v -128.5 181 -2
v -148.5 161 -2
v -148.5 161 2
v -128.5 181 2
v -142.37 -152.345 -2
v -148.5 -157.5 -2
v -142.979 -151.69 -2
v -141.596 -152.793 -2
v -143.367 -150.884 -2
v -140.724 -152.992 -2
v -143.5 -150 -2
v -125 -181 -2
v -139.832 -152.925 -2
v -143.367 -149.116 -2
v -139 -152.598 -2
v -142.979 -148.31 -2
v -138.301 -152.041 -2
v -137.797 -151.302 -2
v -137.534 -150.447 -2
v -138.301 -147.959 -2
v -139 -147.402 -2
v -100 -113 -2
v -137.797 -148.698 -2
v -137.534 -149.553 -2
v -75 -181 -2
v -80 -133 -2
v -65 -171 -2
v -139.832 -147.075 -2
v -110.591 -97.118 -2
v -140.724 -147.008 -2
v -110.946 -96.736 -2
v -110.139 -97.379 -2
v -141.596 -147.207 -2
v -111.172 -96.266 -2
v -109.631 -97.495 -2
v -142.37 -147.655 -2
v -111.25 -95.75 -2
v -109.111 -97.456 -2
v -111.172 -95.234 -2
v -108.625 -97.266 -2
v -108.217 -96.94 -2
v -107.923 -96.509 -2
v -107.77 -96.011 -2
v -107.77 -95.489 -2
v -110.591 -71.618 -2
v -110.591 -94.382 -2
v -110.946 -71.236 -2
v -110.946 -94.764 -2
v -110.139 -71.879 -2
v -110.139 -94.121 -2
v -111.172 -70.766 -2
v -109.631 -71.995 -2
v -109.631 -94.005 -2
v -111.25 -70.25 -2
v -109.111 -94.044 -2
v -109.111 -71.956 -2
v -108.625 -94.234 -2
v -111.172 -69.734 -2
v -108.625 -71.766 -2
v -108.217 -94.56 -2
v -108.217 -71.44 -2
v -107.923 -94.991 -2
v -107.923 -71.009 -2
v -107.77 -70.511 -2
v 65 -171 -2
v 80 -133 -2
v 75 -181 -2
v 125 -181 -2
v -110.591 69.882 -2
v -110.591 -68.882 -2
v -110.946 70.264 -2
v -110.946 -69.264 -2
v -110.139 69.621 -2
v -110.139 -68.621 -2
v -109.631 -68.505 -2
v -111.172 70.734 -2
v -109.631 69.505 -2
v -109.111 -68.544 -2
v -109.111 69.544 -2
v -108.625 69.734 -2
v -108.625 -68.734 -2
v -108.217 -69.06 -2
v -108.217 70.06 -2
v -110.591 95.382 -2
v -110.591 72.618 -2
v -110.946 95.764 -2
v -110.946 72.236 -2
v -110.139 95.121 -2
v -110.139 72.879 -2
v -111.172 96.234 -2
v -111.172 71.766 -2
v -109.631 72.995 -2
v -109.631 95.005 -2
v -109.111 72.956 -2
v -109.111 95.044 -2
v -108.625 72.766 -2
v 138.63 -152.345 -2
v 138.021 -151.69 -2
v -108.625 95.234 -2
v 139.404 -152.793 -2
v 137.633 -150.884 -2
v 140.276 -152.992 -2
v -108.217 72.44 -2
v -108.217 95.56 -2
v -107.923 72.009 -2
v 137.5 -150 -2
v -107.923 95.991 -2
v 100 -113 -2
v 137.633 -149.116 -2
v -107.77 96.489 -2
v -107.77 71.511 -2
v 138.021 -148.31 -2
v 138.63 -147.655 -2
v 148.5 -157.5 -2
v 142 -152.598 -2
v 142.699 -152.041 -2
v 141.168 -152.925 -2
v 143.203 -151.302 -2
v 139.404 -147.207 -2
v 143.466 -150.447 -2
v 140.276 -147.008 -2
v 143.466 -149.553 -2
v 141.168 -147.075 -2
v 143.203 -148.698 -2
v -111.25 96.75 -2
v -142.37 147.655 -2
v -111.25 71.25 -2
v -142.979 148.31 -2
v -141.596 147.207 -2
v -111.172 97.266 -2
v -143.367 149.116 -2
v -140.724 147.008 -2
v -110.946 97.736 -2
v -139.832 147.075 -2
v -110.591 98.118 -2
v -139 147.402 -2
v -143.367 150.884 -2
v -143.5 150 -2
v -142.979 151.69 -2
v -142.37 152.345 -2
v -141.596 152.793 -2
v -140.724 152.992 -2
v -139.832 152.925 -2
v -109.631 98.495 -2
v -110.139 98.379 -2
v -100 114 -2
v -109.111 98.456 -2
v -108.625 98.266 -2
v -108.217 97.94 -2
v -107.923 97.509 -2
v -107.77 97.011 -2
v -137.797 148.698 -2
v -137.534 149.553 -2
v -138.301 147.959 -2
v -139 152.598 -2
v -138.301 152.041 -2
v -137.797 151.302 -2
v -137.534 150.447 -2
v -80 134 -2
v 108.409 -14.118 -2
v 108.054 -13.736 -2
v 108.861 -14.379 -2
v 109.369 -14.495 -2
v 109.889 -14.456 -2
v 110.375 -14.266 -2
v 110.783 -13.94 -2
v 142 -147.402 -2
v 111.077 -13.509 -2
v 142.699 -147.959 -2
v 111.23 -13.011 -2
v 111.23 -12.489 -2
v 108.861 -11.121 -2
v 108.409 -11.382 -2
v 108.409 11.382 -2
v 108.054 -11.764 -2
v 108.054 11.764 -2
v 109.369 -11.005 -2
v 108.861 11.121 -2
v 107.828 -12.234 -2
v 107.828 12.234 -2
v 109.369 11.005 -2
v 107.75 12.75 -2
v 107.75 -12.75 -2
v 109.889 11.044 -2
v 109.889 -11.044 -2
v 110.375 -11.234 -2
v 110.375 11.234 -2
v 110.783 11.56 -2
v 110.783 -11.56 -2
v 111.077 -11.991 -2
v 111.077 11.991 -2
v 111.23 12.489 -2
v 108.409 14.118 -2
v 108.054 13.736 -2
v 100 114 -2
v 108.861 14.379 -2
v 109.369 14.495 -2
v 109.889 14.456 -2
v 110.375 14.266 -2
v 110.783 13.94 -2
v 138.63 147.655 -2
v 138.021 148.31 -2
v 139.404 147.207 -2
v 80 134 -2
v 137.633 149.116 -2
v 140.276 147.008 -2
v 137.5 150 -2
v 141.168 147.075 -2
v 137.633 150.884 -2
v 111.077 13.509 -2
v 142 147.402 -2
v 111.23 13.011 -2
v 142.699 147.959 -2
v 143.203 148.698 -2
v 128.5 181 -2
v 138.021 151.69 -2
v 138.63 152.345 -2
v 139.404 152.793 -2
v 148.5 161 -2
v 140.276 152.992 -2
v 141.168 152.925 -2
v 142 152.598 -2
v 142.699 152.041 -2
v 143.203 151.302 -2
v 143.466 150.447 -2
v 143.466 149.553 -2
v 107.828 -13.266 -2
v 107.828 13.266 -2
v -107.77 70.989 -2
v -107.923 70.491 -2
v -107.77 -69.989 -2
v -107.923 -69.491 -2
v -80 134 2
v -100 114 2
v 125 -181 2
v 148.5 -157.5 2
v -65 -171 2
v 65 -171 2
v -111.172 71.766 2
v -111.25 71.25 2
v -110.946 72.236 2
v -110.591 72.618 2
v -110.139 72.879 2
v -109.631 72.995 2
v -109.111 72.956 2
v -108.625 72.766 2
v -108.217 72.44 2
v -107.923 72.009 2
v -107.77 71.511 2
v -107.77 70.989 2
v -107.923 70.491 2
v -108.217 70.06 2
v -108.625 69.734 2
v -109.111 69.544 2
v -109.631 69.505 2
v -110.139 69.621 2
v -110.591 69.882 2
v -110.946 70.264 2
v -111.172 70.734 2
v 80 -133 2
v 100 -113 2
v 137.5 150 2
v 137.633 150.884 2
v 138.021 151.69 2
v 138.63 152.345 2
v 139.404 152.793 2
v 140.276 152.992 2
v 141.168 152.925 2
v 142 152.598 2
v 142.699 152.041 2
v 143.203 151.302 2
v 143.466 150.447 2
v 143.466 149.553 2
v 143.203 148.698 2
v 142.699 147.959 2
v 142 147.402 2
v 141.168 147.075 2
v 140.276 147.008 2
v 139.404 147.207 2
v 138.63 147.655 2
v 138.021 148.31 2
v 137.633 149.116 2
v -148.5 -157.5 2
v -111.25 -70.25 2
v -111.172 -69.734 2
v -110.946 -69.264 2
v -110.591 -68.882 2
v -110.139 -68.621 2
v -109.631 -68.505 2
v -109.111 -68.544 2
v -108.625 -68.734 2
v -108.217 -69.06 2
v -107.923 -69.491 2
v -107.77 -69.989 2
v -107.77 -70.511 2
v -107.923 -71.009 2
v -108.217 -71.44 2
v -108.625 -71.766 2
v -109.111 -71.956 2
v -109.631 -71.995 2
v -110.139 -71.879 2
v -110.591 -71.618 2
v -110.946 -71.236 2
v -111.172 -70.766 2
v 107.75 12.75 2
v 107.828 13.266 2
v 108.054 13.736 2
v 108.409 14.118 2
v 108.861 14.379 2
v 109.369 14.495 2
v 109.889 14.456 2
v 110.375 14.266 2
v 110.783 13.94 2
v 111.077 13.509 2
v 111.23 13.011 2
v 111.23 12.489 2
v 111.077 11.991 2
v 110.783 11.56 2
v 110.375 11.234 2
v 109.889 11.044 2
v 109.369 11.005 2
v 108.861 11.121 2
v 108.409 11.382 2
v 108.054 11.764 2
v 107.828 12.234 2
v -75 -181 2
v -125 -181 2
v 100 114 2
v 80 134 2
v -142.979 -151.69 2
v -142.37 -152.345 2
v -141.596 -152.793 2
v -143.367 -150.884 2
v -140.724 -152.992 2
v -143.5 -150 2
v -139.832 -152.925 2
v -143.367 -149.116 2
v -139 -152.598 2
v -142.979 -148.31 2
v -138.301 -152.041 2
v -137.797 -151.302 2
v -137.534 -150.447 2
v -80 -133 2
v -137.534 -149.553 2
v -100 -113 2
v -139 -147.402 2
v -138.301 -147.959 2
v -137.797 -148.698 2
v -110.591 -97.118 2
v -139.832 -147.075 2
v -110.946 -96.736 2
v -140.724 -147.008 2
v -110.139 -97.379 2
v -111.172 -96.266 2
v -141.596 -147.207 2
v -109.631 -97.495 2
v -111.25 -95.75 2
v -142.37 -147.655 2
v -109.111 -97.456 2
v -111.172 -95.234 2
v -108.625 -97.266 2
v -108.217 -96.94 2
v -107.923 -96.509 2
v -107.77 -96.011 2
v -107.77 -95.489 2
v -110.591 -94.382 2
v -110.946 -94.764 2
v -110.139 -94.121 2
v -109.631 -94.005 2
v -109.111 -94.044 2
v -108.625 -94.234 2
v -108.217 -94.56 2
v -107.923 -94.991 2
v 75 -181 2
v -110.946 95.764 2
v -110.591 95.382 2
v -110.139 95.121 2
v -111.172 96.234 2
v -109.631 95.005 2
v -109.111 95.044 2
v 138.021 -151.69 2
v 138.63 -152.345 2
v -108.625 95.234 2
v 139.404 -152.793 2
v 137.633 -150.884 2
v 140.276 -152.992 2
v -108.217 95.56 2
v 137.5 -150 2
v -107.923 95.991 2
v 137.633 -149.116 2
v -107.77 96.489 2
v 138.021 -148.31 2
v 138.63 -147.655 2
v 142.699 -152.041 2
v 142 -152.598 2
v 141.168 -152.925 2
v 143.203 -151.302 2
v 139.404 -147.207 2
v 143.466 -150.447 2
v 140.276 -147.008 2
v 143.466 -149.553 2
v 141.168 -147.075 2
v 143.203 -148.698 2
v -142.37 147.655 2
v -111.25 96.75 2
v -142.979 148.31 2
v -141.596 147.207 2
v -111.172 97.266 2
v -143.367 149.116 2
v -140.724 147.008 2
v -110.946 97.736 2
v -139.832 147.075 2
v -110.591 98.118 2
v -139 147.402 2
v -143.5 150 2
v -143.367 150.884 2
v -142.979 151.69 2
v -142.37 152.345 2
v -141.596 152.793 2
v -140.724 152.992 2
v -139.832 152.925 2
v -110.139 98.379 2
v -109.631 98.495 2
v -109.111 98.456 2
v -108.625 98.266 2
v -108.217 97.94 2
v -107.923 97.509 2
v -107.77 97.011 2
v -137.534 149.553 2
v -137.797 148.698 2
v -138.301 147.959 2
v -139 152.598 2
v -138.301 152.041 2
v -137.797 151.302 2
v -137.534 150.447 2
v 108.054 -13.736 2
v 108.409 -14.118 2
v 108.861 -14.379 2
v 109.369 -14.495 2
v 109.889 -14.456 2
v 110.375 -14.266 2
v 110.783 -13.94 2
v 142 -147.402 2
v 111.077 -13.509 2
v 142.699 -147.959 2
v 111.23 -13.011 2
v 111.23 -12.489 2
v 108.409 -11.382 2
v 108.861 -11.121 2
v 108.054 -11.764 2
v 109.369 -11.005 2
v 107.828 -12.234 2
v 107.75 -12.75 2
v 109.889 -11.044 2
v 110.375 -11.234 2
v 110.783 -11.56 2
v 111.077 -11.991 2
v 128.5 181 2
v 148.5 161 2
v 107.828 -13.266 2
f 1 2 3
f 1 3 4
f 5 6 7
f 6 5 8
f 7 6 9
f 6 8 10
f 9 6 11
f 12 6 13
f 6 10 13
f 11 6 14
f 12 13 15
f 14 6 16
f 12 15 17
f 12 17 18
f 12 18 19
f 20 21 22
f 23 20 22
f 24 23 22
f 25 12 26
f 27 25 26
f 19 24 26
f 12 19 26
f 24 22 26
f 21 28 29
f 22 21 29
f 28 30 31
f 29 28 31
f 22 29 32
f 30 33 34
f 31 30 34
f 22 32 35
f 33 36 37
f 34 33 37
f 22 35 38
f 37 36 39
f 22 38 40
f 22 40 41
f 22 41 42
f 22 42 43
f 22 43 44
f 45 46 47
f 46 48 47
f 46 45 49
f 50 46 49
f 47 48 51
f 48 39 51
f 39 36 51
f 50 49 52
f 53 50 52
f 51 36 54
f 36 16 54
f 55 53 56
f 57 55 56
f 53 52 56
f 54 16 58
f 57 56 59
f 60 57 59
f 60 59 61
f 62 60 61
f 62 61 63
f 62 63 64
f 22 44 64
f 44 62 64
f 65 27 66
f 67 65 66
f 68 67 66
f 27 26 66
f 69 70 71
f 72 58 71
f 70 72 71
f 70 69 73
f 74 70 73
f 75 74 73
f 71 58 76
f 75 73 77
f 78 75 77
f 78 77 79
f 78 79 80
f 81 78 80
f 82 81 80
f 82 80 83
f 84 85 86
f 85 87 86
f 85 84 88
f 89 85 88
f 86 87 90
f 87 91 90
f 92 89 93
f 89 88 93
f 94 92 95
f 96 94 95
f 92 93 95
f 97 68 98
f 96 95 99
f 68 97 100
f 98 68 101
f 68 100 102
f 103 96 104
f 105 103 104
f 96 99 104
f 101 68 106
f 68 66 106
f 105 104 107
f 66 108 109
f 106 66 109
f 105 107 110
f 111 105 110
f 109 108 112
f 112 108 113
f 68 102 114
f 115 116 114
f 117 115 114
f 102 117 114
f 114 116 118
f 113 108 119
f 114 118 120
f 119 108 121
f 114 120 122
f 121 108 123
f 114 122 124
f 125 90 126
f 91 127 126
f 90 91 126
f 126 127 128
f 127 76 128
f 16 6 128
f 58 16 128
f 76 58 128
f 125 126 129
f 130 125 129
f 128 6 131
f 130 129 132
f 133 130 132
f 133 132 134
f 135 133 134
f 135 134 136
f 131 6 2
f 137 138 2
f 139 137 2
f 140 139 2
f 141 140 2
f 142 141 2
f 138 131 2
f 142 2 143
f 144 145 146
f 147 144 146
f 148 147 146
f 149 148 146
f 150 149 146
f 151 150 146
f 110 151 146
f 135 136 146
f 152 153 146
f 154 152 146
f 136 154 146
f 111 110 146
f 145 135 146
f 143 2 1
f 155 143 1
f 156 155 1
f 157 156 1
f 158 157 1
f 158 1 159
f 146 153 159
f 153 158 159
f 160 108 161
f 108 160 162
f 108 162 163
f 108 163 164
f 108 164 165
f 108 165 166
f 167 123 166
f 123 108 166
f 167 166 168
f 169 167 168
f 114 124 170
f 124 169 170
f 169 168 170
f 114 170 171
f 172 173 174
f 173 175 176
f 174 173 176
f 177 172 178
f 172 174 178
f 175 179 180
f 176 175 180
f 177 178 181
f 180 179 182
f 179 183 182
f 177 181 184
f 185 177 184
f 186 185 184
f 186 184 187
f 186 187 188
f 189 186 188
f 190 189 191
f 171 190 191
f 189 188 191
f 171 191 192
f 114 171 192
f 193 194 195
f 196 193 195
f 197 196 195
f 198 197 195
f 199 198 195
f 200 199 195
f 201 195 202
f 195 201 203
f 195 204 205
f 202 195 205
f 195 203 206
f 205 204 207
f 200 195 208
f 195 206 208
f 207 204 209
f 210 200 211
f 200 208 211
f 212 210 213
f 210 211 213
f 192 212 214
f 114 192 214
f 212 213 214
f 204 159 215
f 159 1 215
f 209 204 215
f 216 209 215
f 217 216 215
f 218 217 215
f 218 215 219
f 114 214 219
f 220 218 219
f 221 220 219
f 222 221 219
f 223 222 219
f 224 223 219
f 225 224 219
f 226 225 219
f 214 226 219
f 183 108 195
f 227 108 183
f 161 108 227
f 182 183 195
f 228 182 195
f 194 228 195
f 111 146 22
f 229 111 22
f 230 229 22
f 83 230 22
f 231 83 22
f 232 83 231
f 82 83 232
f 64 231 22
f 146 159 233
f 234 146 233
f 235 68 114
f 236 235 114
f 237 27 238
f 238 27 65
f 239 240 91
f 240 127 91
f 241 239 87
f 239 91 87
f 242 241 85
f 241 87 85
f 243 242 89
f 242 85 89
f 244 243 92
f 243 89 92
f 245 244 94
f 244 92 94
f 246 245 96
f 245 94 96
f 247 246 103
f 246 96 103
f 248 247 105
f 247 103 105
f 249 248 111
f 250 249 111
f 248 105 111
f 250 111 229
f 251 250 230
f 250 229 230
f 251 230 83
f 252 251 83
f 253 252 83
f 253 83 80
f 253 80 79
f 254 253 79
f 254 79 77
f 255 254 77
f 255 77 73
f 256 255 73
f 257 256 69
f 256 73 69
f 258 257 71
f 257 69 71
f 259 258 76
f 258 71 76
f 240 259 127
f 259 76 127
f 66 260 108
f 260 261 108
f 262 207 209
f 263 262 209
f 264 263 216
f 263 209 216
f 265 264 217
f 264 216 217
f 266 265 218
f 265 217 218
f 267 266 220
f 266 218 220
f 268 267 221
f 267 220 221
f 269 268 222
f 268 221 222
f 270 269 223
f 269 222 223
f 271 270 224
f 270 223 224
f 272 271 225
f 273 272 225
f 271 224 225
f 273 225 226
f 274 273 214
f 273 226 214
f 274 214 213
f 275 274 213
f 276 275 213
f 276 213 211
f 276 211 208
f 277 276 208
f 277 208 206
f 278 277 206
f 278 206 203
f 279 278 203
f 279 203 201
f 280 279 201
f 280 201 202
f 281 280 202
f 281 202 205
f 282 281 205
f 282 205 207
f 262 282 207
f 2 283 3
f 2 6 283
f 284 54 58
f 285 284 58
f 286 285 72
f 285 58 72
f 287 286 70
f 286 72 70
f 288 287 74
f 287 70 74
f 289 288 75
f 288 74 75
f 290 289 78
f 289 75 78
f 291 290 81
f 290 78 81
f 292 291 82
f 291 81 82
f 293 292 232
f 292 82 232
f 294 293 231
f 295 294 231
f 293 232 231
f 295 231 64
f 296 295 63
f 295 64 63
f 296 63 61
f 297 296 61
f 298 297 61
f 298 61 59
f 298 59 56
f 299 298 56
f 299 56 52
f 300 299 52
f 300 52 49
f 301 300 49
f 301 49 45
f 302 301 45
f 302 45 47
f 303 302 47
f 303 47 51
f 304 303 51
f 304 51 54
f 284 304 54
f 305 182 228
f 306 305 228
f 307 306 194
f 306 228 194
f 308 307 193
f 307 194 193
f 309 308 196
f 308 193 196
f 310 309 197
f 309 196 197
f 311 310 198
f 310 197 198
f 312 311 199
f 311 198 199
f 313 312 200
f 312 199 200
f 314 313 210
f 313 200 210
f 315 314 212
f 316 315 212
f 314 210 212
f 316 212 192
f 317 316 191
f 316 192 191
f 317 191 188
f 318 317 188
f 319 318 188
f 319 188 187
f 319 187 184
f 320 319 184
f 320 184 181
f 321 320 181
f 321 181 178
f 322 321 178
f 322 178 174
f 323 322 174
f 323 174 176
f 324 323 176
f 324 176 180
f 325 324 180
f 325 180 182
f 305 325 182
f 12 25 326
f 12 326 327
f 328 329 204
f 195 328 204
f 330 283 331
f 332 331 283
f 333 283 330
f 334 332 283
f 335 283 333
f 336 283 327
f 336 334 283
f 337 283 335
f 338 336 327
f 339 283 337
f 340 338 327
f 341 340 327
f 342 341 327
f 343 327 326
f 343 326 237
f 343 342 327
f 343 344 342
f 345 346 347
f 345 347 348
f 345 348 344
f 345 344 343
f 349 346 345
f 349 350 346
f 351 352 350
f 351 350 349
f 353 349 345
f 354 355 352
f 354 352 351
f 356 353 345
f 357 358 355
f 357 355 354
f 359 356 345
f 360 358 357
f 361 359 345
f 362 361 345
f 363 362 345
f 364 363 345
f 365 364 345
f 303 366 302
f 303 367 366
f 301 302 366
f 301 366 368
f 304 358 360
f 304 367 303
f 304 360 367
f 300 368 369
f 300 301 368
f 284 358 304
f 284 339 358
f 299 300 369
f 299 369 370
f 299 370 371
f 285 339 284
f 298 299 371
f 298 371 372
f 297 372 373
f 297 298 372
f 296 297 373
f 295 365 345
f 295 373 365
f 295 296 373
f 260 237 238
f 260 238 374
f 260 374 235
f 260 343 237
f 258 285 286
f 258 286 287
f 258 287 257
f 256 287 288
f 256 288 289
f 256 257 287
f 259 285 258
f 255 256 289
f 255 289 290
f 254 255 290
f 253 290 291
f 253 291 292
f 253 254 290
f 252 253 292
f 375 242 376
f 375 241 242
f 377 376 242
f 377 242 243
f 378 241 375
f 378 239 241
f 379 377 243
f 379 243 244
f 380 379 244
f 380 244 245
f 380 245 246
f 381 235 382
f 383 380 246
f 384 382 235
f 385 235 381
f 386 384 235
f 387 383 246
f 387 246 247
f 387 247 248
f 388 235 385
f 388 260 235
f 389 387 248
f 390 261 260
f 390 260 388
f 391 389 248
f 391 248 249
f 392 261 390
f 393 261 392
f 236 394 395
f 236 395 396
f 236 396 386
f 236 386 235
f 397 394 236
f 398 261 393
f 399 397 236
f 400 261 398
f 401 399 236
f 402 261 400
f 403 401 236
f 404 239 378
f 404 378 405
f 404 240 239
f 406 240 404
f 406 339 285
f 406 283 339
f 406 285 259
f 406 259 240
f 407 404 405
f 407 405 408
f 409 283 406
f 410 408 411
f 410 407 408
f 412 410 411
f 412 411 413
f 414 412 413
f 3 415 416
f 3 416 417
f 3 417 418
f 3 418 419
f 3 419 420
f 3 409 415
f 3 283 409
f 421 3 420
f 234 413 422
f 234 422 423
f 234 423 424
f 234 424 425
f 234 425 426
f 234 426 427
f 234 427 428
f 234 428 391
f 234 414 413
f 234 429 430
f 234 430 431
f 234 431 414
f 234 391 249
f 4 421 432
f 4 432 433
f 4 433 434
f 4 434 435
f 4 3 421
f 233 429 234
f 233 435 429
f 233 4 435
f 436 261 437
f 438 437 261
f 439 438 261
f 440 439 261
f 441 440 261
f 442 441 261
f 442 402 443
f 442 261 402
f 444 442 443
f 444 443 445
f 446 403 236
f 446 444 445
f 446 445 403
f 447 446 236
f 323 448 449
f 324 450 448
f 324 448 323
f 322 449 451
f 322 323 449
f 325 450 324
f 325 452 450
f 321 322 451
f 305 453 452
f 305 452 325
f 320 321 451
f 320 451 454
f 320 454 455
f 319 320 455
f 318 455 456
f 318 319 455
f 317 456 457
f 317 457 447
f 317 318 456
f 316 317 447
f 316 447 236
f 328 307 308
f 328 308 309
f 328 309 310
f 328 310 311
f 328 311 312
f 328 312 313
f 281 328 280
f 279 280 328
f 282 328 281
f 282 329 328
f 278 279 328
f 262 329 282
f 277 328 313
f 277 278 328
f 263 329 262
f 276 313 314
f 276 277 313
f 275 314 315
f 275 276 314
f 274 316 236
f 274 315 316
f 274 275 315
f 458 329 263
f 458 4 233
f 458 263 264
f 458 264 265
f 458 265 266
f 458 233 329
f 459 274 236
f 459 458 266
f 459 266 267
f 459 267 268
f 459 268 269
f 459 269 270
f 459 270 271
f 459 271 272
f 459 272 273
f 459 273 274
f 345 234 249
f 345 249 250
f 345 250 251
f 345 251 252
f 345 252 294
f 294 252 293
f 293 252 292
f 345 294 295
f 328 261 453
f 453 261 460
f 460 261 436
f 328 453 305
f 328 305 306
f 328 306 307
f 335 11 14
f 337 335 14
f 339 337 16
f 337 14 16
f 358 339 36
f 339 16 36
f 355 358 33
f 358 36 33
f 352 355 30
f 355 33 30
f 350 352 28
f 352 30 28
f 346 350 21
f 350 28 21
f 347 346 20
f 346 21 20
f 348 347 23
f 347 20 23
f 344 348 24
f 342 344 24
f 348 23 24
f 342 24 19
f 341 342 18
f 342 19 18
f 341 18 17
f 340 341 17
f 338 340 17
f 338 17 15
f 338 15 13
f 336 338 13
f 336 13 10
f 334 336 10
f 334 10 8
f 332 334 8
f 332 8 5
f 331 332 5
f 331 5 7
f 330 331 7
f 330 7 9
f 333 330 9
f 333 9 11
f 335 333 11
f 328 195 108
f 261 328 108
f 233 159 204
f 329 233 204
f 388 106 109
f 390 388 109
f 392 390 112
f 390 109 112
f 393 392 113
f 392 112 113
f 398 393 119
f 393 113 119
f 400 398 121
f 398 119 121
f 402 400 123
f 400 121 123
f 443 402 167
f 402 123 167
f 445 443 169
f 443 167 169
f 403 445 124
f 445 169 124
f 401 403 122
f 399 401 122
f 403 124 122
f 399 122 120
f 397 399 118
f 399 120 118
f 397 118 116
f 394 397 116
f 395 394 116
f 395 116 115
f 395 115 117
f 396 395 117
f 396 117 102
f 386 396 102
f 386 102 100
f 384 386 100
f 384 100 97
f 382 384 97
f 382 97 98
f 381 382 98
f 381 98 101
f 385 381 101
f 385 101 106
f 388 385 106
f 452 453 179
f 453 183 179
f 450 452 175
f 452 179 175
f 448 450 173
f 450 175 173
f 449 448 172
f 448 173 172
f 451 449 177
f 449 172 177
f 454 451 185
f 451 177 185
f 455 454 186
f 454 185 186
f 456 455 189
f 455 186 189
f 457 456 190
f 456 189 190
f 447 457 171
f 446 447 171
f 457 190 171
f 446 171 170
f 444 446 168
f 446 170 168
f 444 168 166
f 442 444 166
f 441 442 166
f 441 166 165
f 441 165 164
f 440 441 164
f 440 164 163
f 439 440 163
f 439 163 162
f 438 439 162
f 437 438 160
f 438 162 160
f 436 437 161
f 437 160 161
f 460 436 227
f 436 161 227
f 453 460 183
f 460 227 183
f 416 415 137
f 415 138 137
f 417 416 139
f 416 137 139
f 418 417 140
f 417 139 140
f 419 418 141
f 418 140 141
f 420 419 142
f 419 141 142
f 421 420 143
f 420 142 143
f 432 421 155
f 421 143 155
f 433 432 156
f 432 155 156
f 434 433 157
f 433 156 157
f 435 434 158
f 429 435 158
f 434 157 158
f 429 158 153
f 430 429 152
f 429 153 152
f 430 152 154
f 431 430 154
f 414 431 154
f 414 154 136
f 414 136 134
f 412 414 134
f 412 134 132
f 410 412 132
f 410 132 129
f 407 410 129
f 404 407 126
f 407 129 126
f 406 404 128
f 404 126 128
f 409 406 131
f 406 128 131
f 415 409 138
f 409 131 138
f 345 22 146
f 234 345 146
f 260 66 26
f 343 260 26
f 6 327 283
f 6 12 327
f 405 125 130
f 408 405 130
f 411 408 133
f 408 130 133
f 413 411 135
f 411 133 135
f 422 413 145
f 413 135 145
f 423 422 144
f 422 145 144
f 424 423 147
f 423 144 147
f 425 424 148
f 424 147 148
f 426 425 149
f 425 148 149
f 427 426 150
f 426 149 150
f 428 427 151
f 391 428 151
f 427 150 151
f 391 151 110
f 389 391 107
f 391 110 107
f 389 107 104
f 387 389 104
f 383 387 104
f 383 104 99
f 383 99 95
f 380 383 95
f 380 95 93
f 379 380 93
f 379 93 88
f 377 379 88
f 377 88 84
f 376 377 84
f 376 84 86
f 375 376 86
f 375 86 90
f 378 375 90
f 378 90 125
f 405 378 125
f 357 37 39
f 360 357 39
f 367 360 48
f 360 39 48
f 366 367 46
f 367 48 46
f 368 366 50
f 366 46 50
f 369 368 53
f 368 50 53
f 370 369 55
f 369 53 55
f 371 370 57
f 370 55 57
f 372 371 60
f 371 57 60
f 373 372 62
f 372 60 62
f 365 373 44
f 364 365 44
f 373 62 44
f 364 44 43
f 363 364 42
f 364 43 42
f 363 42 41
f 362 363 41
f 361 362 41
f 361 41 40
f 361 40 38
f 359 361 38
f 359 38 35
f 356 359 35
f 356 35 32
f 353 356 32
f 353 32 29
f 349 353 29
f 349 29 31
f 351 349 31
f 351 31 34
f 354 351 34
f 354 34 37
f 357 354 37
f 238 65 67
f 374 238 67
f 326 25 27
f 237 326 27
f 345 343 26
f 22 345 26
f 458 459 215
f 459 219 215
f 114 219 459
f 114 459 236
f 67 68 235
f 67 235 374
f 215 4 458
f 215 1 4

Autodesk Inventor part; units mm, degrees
ref_plane "YZ Plane" through (0, 0, 0) normal (1, 0, 0) x (0, 1, 0)
ref_plane "XZ Plane" through (0, 0, 0) normal (0, 1, 0) x (-1, 0, 0)
ref_plane "XY Plane" through (0, 0, 0) normal (0, 0, 1) x (1, 0, 0)
sketch "Hinges" plane through (0, 0, 0) normal (0, 0, 1) x (1, 0, 0)
  circle A0 centre (-464.8647, 95.9101) radius 1.75
  circle A1 centre (-464.8647, 121.4101) radius 1.75
  line L0 (-471.3647, 88.6601) -> (-455.3647, 88.6601)
  line L1 (-455.3647, 88.6601) -> (-455.3647, 128.6601)
  line L2 (-455.3647, 128.6601) -> (-471.3647, 128.6601)
  line L3 (-471.3647, 128.6601) -> (-471.3647, 88.6601)
  circle A2 centre (-439.8647, 121.4101) radius 1.75
  circle A3 centre (-439.8647, 95.9101) radius 1.75
  line L4 (-433.3647, 128.6601) -> (-449.3647, 128.6601)
  line L5 (-449.3647, 128.6601) -> (-449.3647, 88.6601)
  line L6 (-449.3647, 88.6601) -> (-433.3647, 88.6601)
  line L7 (-433.3647, 88.6601) -> (-433.3647, 128.6601)
  point P0 (-452.3647, 108.6601)
  dimension "d30" = 3.5
  dimension "d31" = 25.5
  dimension "d32" = 6.5
  dimension "d33" = 40
  dimension "d34" = 7.25
  dimension "d35" = 16
  dimension "d36" = 3.5
  dimension "d37" = 25.5
  dimension "d38" = 6.5
  dimension "d39" = 40
  dimension "d40" = 7.25
  dimension "d41" = 16
  dimension "d42" = 38
sketch "Sketch1" plane through (0, 0, 0) normal (0, 0, 1) x (1, 0, 0)
  line L0 (-148.5, 181) -> (148.5, 181)
  line L1 (148.5, 181) -> (148.5, -181)
  line L2 (148.5, -181) -> (-148.5, -181)
  line L3 (-148.5, -181) -> (-148.5, 181)
  line L4 (-75, -181) -> (-65, -171)
  line L5 (-75, -181) -> (-60.8579, -181) construction
  line L6 (-65, -171) -> (65, -171)
  line L7 (65, -171) -> (75, -181)
  line L8 (-125, -181) -> (-148.5, -157.5)
  line L9 (-125, -181) -> (-91.766, -181) construction
  line L10 (125, -181) -> (148.5, -157.5)
  line L11 (125, -181) -> (158.234, -181) construction
  line L12 (-148.5, 161) -> (-128.5, 181)
  line L13 (-148.5, 161) -> (-120.2157, 161) construction
  line L14 (148.5, 161) -> (128.5, 181)
  line L15 (-100, 134) -> (100, 134)
  line L16 (100, 134) -> (100, -133)
  line L17 (100, -133) -> (-100, -133)
  line L18 (-100, -133) -> (-100, 134)
  point P0 (0, 0)
  point P1 (0, 181)
  point P2 (-148.5, 0)
  point P3 (0, -171)
  point P4 (0, 134)
  dimension "d0" = 297
  dimension "d1" = 362
  dimension "d2" = 45
  dimension "d3" = 10
  dimension "d4" = 150
  dimension "d5" = 135
  dimension "d6" = 50
  dimension "d7" = 45
  dimension "d8" = 50
  dimension "d9" = 45
  dimension "d10" = 20
  dimension "d11" = 20
  dimension "d12" = 135
  dimension "d13" = 47
  dimension "d14" = 200
  dimension "d15" = 267
extrude "Extrusion1" add sketch "Sketch1" along normal mid plane 4 contours L0 L14 L1 L10 L2 L7 L6 L4 L8 L3 L12
chamfer "Chamfer1" distance 20 angle 45 4 edges at (-100, 134, 0) (100, 134, 0) (-100, -133, 0) (100, -133, 0)
sketch "Sketch3" plane through (0, 0, -2) normal (0, 0, -1) x (-1, 0, 0)
  circle A0 centre (-140.5, 150) radius 3
  circle A1 centre (-140.5, -150) radius 3
  circle A2 centre (140.5, -150) radius 3
  circle A3 centre (140.5, 150) radius 3
  line L0 (-148.5, 161) -> (-148.5, -157.5) projected
  line L1 (148.5, -157.5) -> (148.5, 161) projected
  point P0 (0, 0)
  dimension "d25" = 6
  dimension "d26" = 300
  dimension "d27" = 150
  dimension "d47" = 8
  dimension "d48" = 8
extrude "Extrusion3" cut sketch "Sketch3" against normal blind 37.5
sketch "Sketch4" plane through (0, 0, -2) normal (0, 0, -1) x (-1, 0, 0)
  line L0 (100, 114) -> (100, -113) projected
  line L1 (-100, -113) -> (-100, 114) projected
  circle A0 centre (84.5, 71.25) radius 1.75
  circle A1 centre (84.5, 96.75) radius 1.75
  line L2 (78, 64) -> (94, 64)
  line L3 (94, 64) -> (94, 104)
  line L4 (94, 104) -> (78, 104)
  line L5 (78, 104) -> (78, 64)
  circle A2 centre (109.5, 96.75) radius 1.75
  circle A3 centre (109.5, 71.25) radius 1.75
  line L6 (116, 104) -> (100, 104)
  line L7 (100, 104) -> (100, 64)
  line L8 (100, 64) -> (116, 64)
  line L9 (116, 64) -> (116, 104)
  circle A4 centre (84.5, -95.75) radius 1.75
  circle A5 centre (84.5, -70.25) radius 1.75
  line L10 (78, -103) -> (94, -103)
  line L11 (94, -103) -> (94, -63)
  line L12 (94, -63) -> (78, -63)
  line L13 (78, -63) -> (78, -103)
  circle A6 centre (109.5, -70.25) radius 1.75
  circle A7 centre (109.5, -95.75) radius 1.75
  line L14 (116, -63) -> (100, -63)
  line L15 (100, -63) -> (100, -103)
  line L16 (100, -103) -> (116, -103)
  line L17 (116, -103) -> (116, -63)
  circle A8 centre (-109.5, -12.75) radius 1.75
  circle A9 centre (-109.5, 12.75) radius 1.75
  line L18 (-116, -20) -> (-100, -20)
  line L19 (-100, -20) -> (-100, 20)
  line L20 (-100, 20) -> (-116, 20)
  line L21 (-116, 20) -> (-116, -20)
  circle A10 centre (-84.5, 12.75) radius 1.75
  circle A11 centre (-84.5, -12.75) radius 1.75
  line L22 (-78, 20) -> (-94, 20)
  line L23 (-94, 20) -> (-94, -20)
  line L24 (-94, -20) -> (-78, -20)
  line L25 (-78, -20) -> (-78, 20)
  point P0 (0, 0)
  point P1 (-100, 0)
  dimension "d43" = 10
  dimension "d44" = 10
extrude "Extrusion4" cut sketch "Sketch4" against normal blind 10 contours A2 | A3 | A6 | A7 | A8 | A9
equation "\"d27\" = 0.5 * d26"
equation "\"d34\" = -0.5 * d31 + 0.5 * d33"
equation "\"d40\" = -0.5 * d37 + 0.5 * d39"
equation "\"d8\" = d6"
equation "\"d48\" = d47"
properties part number "Sides Covers" material "Wood (Birch)"
